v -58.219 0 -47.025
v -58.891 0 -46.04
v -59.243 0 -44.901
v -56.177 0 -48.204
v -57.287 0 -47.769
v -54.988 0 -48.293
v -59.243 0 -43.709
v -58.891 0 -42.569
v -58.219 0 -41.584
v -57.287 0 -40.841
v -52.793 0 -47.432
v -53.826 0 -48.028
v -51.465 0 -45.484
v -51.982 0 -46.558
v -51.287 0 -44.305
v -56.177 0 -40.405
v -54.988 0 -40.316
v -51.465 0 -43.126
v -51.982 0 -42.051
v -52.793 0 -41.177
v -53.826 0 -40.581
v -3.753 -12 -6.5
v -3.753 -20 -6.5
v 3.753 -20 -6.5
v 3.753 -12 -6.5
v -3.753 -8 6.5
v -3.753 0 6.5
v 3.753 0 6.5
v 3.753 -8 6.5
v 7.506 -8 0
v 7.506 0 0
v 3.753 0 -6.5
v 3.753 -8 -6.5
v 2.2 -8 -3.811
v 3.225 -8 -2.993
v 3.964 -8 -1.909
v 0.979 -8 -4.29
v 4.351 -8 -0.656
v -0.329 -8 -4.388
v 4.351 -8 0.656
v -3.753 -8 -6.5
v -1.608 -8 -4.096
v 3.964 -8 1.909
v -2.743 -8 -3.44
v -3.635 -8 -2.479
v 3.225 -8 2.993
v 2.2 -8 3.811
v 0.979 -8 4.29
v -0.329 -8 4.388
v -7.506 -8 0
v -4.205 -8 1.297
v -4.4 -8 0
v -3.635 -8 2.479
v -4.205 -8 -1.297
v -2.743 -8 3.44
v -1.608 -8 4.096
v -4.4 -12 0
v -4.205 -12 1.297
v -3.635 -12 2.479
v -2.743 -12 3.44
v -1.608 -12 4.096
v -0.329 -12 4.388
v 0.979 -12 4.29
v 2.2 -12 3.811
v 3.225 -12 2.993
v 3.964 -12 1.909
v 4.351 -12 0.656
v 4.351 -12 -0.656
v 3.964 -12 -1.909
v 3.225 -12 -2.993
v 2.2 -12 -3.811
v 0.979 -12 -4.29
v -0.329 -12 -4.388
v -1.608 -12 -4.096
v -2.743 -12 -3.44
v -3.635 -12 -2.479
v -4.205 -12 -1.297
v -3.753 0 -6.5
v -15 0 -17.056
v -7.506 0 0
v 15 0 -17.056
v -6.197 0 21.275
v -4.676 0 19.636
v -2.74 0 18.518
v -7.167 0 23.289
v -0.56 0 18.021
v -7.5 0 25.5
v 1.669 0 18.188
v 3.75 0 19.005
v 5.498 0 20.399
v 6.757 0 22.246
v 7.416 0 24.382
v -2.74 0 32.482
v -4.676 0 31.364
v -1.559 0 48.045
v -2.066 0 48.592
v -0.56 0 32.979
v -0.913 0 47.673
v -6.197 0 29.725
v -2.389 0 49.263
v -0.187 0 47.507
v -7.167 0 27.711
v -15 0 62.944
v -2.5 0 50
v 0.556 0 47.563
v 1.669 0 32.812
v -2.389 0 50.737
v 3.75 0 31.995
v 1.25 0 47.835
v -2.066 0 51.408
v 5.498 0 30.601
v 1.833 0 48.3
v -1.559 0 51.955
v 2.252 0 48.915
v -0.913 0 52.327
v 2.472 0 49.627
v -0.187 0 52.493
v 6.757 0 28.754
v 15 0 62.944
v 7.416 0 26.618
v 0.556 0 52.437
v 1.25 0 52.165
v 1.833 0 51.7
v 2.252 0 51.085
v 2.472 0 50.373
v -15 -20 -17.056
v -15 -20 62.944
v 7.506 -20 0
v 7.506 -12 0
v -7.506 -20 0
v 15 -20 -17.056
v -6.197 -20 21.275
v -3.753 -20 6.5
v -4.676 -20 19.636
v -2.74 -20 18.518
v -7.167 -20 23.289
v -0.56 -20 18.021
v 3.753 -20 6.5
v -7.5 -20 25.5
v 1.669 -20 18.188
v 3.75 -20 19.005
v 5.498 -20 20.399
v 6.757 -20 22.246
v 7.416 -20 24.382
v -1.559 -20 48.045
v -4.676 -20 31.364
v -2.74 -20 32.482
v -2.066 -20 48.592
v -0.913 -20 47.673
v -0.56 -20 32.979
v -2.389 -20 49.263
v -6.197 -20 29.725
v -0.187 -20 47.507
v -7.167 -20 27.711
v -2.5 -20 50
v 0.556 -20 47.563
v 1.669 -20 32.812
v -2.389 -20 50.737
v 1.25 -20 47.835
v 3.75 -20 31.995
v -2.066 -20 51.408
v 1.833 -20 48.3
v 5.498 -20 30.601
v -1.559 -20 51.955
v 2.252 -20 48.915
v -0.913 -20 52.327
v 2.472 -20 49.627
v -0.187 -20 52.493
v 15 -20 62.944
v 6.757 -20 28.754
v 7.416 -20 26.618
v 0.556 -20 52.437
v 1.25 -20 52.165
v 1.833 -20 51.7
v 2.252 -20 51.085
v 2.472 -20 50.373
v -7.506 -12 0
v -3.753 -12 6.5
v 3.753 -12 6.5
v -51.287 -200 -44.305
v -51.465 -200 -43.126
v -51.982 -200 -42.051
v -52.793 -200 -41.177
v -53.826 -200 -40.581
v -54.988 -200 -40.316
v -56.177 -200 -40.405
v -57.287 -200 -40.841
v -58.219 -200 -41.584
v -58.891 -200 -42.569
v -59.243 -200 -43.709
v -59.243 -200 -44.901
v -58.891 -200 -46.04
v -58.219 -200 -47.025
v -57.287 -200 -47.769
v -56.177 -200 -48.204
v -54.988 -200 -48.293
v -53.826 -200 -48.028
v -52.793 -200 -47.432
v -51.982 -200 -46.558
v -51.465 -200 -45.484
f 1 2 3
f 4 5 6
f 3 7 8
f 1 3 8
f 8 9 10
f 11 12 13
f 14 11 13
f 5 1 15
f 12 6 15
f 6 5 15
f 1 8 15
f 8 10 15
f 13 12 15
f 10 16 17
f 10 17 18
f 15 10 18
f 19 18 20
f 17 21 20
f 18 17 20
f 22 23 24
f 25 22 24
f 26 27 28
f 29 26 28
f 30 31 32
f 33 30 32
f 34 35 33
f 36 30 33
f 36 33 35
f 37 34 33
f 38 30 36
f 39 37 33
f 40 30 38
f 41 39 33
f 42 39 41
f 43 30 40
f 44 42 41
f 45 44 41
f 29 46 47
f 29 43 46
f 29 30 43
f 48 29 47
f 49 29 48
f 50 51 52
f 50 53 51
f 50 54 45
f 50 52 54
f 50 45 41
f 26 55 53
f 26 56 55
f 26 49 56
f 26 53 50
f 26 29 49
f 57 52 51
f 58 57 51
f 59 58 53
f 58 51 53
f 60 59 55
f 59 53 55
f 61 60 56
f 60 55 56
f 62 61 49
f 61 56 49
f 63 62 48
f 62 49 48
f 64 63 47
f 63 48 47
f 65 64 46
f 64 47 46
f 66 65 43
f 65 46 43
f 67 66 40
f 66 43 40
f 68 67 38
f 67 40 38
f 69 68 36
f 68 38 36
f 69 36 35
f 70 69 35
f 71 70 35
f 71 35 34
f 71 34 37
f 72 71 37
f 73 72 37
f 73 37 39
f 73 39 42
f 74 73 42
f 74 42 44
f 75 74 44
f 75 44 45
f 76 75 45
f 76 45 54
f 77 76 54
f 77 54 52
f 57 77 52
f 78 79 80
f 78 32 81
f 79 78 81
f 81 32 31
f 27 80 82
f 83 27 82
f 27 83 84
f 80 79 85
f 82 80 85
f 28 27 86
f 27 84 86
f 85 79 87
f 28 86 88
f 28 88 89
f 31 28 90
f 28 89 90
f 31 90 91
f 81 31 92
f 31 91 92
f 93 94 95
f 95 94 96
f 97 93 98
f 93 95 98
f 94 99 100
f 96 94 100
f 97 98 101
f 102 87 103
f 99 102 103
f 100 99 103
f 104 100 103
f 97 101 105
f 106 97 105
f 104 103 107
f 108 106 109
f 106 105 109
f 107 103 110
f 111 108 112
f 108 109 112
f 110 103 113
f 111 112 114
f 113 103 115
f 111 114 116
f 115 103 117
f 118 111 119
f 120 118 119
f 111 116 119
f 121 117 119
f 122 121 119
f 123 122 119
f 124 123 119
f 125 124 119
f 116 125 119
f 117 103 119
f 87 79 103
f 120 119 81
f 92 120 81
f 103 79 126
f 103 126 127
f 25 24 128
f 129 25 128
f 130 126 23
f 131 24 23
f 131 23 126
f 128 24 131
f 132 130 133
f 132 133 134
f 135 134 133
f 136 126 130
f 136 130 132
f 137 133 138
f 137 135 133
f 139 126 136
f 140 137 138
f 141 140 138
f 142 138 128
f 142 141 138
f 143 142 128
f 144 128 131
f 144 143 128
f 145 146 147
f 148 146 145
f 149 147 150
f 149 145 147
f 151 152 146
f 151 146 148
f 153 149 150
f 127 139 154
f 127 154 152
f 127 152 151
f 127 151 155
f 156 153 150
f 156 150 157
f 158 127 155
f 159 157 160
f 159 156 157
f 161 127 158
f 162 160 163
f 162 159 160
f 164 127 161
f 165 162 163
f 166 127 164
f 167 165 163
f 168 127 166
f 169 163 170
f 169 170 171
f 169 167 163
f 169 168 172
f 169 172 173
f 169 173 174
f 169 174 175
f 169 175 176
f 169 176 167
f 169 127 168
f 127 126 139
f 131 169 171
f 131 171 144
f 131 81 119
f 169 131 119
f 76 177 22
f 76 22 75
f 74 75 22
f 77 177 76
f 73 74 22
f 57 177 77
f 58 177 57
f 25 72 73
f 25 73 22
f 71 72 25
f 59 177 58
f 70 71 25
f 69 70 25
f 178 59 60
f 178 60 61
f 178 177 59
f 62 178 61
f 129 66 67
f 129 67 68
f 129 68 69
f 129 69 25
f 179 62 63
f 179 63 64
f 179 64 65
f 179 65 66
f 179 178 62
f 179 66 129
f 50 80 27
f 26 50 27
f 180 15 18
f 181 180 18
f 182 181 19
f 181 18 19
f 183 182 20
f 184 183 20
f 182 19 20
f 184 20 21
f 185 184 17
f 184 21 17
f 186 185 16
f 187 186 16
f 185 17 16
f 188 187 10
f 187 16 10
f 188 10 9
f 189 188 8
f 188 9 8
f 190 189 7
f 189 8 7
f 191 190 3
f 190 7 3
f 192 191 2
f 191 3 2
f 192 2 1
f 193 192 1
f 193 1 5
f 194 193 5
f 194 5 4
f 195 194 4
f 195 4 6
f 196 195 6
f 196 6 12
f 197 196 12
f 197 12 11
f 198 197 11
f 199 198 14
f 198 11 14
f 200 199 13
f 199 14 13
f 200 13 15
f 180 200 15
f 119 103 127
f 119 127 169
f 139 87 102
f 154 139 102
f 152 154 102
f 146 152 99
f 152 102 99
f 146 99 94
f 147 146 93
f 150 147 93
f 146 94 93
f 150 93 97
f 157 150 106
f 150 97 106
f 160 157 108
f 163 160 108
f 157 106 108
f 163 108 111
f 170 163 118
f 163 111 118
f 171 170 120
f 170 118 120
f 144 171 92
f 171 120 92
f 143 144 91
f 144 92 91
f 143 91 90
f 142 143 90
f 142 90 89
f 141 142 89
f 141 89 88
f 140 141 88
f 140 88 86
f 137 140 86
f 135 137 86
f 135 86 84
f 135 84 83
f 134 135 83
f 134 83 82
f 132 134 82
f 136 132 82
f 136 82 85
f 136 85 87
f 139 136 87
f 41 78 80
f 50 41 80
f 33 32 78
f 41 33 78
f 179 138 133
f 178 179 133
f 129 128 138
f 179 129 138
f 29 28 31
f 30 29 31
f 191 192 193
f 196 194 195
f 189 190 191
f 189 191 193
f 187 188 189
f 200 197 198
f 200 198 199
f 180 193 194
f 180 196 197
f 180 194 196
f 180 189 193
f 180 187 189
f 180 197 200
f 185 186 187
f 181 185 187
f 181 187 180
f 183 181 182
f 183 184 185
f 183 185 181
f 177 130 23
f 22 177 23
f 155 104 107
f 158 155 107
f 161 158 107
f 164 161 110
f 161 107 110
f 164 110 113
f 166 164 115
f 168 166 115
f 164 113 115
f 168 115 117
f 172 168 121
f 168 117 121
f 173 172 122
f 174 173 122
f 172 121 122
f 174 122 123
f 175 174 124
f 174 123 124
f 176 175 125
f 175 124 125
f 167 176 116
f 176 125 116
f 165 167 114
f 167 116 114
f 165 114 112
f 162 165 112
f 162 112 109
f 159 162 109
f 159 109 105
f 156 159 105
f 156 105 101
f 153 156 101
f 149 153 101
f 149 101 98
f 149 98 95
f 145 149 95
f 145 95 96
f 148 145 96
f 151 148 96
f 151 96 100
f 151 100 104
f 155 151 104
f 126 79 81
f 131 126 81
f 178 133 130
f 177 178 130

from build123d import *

# Parameters (mm, degrees)
F0_W     = 30
F0_H     = 80
F1_DEPTH = 20
F3_DEPTH = 8
F5_D     = 8.8
F7_DEPTH = 8
F8_R     = 4
F9_DEPTH = 200
F11_D    = 15
F13_D    = 5


with BuildPart() as f1:
    # F0 (on Front) → F1 (new body)
    with BuildSketch(Plane.XZ):
        with Locations((0, 22.9441225534)):
            Rectangle(F0_W, F0_H)
    extrude(amount=F1_DEPTH)

    # F2 (on face) → F3 (cut)
    with BuildSketch(Plane.XZ.offset(20)):
        Polygon((3.7527767497, 6.5), (-3.7527767497, 6.5), (-7.5055534995, 0), (-3.7527767497, -6.5), (3.7527767497, -6.5), (7.5055534995, 0), align=None)
    extrude(amount=-F3_DEPTH, mode=Mode.SUBTRACT)

    # F5 (through all)
    with Locations(Plane.XZ.offset(12)):
        with Locations((0, 0)):
            Hole(F5_D / 2)

    # F6 (on face) → F7 (cut)
    with BuildSketch(Plane(origin=(0, 0, 0), x_dir=(-1, 0, 0), z_dir=(0, 1, 0))):
        Polygon((3.7527767497, -6.5), (7.5055534995, 0), (3.7527767497, 6.5), (-3.7527767497, 6.5), (-7.5055534995, 0), (-3.7527767497, -6.5), align=None)
    extrude(amount=-F7_DEPTH, mode=Mode.SUBTRACT)

    # F11 (through all)
    with Locations(Plane.XZ.offset(20)):
        with Locations((0, 25.5)):
            Hole(F11_D / 2)

    # F13 (through all)
    with Locations(Plane.XZ.offset(20)):
        with Locations((0, 50)):
            Hole(F13_D / 2)


with BuildPart() as f9:
    # F8 (on Front) → F9 (new body)
    with BuildSketch(Plane.XZ):
        with Locations((-55.2872419357, -44.3046763539)):
            Circle(F8_R)
    extrude(amount=F9_DEPTH)


solid = Compound([f1.part, f9.part])
